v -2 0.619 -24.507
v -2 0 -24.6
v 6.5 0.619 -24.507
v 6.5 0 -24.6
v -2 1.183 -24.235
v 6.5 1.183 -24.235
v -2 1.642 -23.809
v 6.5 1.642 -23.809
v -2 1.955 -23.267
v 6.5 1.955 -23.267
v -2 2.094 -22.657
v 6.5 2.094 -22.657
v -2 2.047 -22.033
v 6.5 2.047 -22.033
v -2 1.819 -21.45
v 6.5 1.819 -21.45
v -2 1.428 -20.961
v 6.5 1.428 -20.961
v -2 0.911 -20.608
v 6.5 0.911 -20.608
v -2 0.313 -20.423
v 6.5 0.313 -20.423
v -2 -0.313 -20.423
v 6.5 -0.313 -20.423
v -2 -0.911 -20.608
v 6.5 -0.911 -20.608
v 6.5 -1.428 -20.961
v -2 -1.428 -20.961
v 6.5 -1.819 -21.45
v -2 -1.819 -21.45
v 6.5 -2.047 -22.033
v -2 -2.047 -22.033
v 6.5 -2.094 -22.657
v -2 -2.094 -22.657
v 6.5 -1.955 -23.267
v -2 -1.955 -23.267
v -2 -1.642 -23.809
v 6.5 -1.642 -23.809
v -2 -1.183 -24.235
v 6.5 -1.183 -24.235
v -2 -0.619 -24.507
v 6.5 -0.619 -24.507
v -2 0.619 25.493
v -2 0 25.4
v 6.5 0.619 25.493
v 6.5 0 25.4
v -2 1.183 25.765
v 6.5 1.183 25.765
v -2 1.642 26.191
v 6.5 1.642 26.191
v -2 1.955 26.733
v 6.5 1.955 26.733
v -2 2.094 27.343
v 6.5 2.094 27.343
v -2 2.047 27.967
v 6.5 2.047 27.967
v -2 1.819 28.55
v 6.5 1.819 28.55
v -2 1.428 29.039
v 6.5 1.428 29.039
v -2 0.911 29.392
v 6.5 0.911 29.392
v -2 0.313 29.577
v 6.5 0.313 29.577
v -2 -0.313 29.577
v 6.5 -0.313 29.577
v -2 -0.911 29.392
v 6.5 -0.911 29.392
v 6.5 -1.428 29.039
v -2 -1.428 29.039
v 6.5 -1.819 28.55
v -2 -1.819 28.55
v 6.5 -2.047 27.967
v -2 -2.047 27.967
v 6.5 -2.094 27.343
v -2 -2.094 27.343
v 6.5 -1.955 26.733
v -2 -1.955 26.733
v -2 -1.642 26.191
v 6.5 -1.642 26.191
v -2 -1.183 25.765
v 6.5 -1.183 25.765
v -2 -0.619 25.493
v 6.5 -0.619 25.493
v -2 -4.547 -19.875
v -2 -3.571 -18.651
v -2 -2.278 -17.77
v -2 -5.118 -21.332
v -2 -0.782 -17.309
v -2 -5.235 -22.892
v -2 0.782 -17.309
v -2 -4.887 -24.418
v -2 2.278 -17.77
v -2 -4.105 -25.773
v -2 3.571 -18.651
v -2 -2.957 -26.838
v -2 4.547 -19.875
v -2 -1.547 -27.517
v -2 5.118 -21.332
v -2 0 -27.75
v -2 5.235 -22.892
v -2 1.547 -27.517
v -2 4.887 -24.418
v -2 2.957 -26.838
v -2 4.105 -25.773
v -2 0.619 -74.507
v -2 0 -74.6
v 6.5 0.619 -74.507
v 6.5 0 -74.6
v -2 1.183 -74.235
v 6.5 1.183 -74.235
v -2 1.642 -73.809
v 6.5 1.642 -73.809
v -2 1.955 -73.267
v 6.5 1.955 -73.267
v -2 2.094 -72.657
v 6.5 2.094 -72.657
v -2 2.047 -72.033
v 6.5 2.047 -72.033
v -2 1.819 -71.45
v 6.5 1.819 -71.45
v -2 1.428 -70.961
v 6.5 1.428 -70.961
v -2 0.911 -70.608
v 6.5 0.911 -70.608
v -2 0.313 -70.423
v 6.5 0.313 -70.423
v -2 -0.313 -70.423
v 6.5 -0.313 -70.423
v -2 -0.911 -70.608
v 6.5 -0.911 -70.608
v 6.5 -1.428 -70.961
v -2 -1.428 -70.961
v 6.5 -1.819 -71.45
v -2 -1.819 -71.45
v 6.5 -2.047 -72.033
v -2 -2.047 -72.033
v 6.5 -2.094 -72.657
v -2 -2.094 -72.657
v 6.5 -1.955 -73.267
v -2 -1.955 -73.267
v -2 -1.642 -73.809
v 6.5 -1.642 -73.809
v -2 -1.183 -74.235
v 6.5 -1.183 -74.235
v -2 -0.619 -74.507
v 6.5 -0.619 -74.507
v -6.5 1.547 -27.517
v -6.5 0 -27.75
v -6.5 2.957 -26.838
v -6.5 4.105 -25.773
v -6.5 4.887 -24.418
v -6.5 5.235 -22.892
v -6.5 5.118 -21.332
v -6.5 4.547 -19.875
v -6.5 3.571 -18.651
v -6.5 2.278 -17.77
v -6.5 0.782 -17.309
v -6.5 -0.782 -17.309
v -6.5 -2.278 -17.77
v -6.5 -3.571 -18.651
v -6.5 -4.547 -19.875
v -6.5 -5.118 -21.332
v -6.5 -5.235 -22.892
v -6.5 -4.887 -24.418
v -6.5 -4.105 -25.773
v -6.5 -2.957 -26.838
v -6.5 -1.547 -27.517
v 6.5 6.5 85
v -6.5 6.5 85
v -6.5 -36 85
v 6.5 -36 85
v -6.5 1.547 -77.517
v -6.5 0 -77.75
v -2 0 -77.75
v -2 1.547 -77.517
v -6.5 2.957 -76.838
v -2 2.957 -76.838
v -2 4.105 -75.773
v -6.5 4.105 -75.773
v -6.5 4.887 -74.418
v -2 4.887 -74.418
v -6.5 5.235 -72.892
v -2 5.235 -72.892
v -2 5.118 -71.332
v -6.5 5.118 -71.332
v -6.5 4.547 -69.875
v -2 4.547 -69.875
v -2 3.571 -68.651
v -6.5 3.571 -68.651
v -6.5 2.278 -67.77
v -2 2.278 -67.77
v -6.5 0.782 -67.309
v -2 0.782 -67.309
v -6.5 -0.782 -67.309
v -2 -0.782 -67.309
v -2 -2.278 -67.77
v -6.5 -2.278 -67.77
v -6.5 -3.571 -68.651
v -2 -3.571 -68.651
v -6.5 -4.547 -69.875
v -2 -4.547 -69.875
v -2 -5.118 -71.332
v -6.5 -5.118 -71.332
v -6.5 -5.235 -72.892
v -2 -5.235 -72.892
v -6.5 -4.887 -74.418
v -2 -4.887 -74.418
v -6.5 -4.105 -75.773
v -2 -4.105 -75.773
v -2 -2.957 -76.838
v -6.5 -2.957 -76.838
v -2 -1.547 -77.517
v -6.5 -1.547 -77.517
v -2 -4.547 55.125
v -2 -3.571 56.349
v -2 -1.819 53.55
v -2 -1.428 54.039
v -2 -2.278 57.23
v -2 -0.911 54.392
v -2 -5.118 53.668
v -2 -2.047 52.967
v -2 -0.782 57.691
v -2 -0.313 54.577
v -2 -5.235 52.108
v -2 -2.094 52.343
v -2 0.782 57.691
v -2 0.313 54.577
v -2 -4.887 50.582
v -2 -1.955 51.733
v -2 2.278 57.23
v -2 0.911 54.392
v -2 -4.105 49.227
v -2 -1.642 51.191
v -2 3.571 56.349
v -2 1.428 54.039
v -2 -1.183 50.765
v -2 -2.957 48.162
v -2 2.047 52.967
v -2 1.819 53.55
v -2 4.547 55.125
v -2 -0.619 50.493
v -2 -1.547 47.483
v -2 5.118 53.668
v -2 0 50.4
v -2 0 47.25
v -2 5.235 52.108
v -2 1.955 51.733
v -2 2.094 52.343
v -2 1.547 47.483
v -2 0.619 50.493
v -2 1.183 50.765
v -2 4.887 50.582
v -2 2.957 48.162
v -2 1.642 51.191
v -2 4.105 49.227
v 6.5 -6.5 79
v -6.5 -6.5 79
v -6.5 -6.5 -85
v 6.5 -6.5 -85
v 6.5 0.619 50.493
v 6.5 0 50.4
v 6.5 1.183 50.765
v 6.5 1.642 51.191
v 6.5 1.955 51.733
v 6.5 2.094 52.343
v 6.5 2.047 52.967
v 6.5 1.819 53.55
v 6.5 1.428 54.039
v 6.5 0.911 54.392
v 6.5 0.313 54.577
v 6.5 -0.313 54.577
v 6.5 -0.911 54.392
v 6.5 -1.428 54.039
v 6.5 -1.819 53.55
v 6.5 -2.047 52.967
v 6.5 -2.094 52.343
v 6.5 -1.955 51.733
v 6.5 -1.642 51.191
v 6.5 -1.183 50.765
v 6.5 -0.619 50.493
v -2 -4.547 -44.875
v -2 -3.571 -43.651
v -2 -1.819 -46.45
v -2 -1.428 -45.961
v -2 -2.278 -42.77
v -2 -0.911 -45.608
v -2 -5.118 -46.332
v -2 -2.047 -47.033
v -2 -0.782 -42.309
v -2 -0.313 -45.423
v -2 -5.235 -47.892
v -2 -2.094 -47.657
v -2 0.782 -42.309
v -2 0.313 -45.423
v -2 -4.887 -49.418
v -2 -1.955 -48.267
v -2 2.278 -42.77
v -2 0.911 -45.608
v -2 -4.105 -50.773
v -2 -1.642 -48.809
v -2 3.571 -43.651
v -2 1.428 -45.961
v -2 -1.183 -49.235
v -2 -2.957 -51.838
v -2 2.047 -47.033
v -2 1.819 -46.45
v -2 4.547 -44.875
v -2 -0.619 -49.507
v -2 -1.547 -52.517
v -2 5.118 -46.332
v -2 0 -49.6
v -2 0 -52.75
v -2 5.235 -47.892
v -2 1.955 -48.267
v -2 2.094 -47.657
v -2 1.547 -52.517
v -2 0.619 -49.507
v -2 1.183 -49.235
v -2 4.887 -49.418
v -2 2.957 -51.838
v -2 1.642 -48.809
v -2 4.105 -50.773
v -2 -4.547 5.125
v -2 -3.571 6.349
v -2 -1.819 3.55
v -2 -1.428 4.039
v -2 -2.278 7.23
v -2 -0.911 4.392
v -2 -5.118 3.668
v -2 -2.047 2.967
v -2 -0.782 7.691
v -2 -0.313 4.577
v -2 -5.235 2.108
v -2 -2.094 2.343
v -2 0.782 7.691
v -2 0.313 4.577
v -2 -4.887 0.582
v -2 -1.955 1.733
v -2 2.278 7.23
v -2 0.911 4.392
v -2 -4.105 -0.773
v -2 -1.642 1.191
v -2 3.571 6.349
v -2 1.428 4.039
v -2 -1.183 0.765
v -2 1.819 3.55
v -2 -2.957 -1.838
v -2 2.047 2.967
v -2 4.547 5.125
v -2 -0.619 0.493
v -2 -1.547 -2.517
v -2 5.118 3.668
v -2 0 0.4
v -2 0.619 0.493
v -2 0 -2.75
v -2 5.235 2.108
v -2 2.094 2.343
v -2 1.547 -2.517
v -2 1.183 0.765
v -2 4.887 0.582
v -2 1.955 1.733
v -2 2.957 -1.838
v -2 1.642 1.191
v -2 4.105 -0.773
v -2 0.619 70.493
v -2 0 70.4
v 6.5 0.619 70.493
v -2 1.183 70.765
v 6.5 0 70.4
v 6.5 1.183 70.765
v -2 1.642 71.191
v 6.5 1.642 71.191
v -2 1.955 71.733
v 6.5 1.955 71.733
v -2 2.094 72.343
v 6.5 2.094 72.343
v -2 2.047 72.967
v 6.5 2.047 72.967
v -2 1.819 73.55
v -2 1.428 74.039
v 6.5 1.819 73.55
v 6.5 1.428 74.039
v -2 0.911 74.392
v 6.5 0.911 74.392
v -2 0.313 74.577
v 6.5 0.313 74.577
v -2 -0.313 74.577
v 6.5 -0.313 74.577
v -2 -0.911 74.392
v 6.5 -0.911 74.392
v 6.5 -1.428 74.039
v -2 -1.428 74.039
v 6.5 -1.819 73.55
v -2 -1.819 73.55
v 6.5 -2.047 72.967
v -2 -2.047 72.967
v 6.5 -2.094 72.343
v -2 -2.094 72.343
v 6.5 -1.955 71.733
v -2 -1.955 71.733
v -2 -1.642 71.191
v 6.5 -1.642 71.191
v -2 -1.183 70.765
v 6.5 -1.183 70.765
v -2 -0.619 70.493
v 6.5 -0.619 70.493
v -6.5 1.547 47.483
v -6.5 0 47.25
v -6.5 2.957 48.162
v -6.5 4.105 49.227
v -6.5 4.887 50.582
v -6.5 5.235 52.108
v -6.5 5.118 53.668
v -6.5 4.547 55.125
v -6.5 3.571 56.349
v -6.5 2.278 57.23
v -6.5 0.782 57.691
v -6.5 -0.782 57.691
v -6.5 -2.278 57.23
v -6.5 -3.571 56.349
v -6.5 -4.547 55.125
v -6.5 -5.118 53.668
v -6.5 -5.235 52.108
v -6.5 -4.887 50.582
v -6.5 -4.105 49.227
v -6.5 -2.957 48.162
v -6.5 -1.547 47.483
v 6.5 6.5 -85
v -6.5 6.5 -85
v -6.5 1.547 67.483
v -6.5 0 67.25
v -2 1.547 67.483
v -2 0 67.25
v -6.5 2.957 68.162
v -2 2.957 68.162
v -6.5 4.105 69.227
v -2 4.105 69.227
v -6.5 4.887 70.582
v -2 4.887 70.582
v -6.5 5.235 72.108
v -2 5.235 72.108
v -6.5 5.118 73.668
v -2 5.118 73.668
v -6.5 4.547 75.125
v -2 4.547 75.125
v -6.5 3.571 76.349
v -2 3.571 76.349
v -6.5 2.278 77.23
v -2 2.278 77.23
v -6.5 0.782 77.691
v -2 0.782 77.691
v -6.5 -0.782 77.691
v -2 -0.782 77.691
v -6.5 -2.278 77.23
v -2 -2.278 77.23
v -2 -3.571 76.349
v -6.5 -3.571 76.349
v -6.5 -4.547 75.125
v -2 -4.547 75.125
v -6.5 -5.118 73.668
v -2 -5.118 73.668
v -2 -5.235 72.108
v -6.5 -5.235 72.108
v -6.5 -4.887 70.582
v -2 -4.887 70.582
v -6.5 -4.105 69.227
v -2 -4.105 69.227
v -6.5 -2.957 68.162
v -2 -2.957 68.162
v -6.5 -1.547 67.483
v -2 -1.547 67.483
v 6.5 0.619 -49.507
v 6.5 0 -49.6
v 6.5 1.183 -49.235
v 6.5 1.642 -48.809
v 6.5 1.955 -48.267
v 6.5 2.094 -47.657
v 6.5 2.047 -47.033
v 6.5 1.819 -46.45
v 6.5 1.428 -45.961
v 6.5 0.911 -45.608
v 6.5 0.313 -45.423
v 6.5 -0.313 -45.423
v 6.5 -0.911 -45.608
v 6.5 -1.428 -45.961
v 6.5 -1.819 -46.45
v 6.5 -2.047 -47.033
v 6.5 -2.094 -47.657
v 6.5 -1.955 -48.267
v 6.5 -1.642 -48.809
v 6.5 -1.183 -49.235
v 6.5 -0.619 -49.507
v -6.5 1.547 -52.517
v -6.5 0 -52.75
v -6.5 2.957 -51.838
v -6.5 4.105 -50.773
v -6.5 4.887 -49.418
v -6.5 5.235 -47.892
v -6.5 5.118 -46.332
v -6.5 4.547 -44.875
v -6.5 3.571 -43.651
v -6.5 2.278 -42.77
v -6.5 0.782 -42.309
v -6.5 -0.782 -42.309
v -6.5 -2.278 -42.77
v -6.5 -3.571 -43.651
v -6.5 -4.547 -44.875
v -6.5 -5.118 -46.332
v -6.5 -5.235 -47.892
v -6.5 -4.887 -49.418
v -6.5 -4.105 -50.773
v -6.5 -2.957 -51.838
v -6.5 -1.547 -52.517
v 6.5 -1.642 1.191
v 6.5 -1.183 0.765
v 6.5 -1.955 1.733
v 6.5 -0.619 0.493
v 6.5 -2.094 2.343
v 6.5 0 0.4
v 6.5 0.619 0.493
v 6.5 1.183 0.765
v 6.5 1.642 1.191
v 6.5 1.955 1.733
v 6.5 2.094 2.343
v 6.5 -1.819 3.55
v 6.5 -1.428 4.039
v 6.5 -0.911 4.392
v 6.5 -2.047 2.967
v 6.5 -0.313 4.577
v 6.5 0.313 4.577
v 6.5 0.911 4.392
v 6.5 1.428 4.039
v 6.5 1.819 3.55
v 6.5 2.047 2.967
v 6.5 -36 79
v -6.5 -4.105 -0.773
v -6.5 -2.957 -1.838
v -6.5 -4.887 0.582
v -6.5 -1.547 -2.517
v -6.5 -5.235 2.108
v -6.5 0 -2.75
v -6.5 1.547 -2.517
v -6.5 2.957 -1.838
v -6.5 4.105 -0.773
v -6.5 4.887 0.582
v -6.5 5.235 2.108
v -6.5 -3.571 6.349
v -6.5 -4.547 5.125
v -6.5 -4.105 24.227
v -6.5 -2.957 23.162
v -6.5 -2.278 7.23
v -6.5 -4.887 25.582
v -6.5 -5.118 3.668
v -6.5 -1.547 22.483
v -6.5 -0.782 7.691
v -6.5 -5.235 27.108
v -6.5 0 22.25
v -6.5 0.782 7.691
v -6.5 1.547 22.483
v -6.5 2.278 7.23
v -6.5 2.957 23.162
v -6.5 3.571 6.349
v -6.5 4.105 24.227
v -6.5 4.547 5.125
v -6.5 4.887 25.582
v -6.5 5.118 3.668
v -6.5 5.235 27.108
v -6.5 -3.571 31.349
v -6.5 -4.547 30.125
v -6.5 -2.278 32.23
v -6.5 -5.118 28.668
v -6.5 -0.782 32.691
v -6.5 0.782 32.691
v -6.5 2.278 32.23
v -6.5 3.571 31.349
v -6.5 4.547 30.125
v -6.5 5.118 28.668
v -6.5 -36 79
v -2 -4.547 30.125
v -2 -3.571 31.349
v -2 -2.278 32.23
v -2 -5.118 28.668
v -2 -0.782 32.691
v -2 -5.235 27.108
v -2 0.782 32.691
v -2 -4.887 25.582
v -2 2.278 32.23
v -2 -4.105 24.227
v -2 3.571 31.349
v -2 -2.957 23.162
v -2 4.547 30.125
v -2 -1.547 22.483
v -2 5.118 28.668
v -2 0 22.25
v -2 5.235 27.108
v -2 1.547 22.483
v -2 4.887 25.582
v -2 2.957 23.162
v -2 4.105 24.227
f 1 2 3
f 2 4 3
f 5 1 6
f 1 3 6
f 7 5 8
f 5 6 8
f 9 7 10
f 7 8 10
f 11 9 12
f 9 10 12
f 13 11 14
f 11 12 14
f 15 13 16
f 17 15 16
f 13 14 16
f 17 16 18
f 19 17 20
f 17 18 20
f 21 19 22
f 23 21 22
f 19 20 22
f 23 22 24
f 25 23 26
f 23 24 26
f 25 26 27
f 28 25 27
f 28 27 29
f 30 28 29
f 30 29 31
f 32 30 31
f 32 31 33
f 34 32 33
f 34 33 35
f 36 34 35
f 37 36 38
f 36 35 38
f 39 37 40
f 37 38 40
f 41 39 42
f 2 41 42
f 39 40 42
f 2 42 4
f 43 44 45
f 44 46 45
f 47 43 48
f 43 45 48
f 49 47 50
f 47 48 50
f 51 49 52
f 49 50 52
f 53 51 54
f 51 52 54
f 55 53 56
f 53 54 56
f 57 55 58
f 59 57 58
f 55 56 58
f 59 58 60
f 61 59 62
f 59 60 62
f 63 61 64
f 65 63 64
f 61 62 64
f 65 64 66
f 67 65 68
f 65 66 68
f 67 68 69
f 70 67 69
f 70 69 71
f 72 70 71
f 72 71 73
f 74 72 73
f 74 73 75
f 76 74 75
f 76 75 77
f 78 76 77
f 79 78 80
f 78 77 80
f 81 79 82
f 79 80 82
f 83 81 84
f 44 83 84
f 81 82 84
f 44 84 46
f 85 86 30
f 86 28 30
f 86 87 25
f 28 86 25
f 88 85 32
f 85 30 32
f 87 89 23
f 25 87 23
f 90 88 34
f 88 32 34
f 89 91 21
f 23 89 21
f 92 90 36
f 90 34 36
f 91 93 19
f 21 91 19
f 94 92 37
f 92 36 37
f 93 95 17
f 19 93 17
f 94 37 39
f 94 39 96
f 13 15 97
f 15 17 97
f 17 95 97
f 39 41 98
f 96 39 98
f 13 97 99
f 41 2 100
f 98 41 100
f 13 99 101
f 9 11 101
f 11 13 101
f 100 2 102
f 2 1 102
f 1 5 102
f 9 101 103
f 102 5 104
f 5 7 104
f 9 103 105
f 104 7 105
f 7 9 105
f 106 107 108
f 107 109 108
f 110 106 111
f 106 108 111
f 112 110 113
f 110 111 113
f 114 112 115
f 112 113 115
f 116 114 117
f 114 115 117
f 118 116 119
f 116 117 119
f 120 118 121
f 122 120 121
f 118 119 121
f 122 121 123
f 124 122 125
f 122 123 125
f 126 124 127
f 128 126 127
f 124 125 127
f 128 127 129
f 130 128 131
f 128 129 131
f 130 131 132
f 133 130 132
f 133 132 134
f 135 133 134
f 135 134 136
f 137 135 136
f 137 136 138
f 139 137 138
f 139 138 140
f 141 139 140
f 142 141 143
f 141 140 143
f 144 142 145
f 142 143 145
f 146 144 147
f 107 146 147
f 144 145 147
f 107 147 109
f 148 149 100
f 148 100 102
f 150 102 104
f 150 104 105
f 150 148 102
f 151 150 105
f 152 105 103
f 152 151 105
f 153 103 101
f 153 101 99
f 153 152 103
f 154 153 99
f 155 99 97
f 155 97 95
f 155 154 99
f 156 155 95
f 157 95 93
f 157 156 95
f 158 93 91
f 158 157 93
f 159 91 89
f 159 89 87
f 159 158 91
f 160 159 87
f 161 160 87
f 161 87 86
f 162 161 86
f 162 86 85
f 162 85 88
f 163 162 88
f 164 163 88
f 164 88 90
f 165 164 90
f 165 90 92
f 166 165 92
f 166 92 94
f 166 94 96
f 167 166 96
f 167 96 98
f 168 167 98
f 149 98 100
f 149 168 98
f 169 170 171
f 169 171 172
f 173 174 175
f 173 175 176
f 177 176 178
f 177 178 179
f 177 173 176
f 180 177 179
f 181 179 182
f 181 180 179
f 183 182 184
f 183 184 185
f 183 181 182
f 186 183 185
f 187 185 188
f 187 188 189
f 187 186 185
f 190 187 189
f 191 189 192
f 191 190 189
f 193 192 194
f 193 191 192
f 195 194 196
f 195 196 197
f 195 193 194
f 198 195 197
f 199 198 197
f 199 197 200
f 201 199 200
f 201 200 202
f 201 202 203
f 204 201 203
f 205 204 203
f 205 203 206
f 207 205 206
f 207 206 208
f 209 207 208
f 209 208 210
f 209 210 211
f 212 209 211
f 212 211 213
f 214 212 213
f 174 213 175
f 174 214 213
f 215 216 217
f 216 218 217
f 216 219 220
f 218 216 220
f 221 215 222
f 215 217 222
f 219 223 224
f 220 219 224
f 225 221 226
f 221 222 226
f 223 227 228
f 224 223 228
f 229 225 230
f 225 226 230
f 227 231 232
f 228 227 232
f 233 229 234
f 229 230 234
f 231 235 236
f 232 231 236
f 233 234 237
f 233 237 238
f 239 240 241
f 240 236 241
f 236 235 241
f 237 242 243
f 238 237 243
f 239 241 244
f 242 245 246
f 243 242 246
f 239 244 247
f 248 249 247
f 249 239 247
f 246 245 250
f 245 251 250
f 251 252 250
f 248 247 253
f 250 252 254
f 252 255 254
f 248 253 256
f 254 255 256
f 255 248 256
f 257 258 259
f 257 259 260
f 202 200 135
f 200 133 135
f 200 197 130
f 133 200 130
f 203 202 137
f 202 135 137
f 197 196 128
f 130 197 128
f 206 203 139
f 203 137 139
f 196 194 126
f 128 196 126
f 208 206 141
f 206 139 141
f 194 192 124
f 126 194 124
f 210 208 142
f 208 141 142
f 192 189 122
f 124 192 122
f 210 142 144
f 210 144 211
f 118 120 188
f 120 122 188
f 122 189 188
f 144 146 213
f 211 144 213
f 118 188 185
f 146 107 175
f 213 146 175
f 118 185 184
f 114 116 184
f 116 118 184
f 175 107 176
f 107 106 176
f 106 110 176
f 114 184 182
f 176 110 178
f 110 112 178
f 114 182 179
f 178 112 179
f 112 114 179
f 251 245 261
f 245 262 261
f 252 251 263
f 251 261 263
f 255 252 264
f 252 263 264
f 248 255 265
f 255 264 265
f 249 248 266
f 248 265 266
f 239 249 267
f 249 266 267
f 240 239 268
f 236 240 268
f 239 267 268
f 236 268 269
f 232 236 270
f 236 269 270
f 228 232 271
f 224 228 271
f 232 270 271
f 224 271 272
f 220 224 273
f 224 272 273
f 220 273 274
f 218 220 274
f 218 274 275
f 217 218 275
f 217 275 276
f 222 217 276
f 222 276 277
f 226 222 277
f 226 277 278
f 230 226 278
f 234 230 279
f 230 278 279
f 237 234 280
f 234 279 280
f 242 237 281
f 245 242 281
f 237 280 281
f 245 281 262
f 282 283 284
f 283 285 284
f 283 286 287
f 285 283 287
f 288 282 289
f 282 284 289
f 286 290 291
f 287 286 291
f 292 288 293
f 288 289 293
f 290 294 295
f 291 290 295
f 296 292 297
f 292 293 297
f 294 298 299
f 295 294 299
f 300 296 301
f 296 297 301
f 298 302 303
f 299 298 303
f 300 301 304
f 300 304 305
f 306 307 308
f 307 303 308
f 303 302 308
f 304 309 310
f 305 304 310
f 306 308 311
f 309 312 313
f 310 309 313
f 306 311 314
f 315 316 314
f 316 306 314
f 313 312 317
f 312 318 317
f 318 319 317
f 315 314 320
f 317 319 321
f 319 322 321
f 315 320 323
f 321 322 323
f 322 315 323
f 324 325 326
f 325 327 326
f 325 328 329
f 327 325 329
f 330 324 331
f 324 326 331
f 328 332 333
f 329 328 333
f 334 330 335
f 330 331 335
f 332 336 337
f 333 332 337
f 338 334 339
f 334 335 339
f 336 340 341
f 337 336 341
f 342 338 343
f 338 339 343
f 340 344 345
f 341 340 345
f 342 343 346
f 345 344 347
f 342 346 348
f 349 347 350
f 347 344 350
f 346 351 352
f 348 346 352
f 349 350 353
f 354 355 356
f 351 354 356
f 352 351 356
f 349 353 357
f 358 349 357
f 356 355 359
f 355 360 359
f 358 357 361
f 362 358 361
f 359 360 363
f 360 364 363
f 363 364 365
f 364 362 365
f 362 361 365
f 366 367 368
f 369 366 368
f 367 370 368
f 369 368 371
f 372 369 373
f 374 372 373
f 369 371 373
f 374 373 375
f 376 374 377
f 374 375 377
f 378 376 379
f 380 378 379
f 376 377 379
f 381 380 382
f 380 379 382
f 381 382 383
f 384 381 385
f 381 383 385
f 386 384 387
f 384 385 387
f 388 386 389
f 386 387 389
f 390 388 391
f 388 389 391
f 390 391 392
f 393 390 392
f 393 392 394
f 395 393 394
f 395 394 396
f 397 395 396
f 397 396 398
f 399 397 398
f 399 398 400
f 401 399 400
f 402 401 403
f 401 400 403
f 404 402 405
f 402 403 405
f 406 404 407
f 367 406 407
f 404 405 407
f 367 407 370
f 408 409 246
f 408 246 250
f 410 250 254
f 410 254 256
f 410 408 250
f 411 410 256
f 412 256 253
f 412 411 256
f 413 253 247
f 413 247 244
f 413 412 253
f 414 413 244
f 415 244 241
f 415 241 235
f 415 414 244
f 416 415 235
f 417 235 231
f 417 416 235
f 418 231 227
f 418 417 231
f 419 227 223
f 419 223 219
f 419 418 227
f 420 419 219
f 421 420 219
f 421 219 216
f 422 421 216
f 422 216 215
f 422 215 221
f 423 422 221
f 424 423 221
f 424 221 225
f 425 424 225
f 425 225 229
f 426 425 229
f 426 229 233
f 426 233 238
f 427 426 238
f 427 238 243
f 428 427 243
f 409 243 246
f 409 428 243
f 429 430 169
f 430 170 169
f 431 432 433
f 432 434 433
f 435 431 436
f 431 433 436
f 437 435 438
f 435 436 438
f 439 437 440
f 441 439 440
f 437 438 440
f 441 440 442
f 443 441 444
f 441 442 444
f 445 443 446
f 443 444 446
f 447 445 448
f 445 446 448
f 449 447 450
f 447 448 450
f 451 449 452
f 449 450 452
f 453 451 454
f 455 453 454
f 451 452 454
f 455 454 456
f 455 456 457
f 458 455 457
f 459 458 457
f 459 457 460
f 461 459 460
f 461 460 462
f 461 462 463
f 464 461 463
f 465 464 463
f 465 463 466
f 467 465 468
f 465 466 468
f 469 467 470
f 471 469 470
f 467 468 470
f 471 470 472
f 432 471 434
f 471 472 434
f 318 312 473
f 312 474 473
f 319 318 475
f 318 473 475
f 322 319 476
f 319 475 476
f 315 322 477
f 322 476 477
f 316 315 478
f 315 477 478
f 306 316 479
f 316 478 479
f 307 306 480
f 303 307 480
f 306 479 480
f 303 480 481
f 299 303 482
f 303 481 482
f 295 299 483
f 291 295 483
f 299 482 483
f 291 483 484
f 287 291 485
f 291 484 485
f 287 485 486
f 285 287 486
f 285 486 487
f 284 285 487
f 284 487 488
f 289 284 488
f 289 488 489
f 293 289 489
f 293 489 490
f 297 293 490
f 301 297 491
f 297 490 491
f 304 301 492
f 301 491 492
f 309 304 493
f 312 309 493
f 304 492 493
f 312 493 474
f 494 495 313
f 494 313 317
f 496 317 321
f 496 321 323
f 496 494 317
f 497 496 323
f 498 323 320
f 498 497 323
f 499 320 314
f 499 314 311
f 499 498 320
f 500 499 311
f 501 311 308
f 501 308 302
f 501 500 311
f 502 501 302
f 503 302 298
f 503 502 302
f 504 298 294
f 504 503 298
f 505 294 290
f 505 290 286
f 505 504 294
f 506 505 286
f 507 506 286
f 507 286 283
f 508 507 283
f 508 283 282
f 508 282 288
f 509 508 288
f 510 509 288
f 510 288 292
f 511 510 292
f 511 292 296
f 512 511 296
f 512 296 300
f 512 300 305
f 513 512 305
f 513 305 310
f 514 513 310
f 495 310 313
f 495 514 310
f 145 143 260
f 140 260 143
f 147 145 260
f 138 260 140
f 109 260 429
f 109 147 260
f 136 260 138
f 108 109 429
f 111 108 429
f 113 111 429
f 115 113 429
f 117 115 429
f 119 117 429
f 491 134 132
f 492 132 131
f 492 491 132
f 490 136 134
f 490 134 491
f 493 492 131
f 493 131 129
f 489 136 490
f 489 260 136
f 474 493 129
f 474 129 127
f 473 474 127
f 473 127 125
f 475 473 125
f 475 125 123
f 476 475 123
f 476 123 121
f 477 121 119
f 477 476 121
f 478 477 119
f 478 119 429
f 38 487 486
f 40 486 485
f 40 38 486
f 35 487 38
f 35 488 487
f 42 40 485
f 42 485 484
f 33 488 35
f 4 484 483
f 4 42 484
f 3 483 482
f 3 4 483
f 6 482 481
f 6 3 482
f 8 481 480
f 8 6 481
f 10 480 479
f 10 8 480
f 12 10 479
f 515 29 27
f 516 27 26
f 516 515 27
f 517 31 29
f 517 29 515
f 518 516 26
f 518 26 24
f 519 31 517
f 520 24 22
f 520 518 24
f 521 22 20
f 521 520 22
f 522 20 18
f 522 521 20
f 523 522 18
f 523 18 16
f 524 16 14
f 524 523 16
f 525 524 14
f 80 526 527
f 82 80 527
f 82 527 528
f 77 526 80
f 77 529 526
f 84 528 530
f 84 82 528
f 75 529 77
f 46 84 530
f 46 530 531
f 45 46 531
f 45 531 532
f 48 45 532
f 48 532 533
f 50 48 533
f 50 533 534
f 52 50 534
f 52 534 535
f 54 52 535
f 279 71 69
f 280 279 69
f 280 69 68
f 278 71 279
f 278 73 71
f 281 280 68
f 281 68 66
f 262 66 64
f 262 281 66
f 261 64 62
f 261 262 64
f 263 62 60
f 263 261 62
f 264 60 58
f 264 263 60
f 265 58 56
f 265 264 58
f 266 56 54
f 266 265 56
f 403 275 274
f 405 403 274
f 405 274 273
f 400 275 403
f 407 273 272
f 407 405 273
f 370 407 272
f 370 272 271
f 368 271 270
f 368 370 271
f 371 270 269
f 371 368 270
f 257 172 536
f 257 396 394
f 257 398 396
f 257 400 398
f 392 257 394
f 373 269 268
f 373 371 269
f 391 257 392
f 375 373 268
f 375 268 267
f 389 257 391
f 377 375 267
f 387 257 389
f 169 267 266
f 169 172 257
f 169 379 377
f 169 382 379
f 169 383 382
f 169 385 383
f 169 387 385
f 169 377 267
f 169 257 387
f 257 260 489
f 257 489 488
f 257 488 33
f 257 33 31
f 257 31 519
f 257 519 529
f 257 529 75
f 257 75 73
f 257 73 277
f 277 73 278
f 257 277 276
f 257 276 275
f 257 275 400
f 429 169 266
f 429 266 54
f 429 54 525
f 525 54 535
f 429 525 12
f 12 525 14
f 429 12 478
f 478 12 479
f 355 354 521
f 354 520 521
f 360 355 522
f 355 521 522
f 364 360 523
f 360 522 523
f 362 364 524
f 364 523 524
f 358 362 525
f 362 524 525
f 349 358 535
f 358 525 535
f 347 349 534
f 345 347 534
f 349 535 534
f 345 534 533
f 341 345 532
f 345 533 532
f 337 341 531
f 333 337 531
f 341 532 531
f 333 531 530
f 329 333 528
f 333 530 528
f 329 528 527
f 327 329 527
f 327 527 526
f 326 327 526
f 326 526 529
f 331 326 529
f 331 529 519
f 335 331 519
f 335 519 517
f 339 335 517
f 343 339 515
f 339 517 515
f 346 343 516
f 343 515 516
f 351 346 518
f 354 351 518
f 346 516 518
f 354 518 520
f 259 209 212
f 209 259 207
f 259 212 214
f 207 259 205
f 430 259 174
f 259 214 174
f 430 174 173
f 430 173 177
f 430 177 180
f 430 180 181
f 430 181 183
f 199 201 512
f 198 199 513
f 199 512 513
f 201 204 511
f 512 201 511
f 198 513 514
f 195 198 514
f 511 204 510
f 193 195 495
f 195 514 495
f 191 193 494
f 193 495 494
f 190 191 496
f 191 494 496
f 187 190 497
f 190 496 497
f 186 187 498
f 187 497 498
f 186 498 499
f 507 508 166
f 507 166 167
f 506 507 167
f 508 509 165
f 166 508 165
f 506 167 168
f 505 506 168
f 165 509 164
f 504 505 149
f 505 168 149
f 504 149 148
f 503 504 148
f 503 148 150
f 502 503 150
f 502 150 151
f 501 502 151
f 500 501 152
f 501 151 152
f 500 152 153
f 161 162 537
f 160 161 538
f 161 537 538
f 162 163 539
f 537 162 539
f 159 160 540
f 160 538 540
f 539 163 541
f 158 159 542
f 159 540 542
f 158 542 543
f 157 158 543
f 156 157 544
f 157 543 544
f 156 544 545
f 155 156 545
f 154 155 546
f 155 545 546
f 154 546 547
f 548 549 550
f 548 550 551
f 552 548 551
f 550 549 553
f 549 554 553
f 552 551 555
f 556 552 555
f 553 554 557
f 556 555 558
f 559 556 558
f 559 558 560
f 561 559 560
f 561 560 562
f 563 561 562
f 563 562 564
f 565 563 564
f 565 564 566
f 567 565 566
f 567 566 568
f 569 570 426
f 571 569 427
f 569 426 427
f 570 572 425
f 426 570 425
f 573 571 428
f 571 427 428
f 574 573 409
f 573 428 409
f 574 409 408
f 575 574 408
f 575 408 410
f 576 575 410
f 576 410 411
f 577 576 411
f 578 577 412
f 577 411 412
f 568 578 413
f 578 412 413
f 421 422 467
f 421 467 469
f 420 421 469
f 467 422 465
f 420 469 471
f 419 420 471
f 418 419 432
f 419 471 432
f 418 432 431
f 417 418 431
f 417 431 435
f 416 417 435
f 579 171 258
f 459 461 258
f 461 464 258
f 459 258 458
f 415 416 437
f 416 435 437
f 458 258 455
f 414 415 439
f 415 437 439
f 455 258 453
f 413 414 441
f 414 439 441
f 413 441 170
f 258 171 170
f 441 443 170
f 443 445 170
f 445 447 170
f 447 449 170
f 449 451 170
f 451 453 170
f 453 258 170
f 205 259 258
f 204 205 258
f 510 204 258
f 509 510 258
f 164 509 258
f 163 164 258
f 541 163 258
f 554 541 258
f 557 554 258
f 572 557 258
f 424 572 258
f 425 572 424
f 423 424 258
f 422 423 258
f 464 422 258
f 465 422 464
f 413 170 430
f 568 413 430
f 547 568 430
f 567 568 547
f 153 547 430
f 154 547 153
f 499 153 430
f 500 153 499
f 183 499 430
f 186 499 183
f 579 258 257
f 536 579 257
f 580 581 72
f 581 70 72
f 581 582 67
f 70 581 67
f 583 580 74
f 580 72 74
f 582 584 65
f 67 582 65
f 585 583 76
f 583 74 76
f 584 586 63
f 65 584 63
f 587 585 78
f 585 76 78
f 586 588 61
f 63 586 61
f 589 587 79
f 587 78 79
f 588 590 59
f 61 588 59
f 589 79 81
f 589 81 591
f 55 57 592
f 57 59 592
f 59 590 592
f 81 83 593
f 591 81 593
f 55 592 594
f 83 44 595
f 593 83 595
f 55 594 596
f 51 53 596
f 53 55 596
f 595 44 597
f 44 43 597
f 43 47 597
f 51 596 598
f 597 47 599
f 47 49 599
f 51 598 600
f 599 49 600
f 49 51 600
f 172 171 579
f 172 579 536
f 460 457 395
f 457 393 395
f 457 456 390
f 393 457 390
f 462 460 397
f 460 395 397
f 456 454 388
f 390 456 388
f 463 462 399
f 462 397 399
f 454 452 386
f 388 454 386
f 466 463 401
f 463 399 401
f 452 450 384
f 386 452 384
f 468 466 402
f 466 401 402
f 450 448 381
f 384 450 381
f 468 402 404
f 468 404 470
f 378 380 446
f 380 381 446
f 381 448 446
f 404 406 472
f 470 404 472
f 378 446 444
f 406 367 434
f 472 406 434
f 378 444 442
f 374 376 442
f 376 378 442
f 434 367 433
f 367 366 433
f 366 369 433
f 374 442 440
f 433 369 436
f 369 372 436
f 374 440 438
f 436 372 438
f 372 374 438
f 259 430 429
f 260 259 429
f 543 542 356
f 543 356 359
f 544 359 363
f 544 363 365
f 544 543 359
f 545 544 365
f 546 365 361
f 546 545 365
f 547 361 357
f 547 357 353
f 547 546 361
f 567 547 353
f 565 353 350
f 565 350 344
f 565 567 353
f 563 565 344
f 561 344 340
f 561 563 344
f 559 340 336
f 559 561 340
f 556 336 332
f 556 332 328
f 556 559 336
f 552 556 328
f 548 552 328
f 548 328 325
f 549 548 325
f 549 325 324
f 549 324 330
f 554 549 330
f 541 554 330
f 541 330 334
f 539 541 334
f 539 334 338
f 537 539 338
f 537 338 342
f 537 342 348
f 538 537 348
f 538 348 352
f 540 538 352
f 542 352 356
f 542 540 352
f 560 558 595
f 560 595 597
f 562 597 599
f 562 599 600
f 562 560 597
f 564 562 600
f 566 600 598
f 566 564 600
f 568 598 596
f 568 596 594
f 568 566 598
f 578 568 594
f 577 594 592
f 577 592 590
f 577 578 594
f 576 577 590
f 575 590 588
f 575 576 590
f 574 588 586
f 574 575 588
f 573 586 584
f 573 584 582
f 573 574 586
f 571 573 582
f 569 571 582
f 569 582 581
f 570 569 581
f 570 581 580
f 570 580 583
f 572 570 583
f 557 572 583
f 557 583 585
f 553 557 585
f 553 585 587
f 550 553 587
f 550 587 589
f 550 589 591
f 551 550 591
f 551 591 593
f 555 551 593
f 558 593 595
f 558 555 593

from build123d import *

# Parameters (mm, degrees)
SKETCH1_W           = 13
SKETCH1_H           = 13
BOSS_EXTRUDE1_DEPTH = 85
SKETCH2_W           = 13
SKETCH2_H           = 30.5
BOSS_EXTRUDE2_DEPTH = 3
SKETCH3_R           = 2.1
CUT_EXTRUDE1_DEPTH  = 11.5
SKETCH4_R           = 5.25
CUT_EXTRUDE2_DEPTH  = 4.5


with BuildPart() as part:
    # Sketch1 → Boss-Extrude1 (new, symmetric)
    with BuildSketch(Plane.XY):
        Rectangle(SKETCH1_W, SKETCH1_H)
    extrude(amount=BOSS_EXTRUDE1_DEPTH, both=True)

    # Sketch2 → Boss-Extrude2 (add, symmetric)
    with BuildSketch(Plane.XY.offset(82)):
        with Locations((0, -20.75)):
            Rectangle(SKETCH2_W, SKETCH2_H)
    extrude(amount=BOSS_EXTRUDE2_DEPTH, both=True)

    # Sketch3 → Cut-Extrude1 (cut, symmetric)
    with BuildSketch(Plane(origin=(0, 0, 0), x_dir=(0, 0, -1), z_dir=(1, 0, 0))):
        with Locations((72.5, 0)):
            Circle(SKETCH3_R)
        with Locations((47.5, 0)):
            Circle(SKETCH3_R)
        with Locations((22.5, 0)):
            Circle(SKETCH3_R)
        with Locations((-2.5, 0)):
            Circle(SKETCH3_R)
        with Locations((-27.5, 0)):
            Circle(SKETCH3_R)
        with Locations((-52.5, 0)):
            Circle(SKETCH3_R)
        with Locations((-72.5, 0)):
            Circle(SKETCH3_R)
    extrude(amount=CUT_EXTRUDE1_DEPTH, both=True, mode=Mode.SUBTRACT)

    # Sketch4 → Cut-Extrude2 (cut, symmetric)
    with BuildSketch(Plane(origin=(-6.5, 0, 0), x_dir=(0, 0, -1), z_dir=(1, 0, 0))):
        with Locations((72.5, 0)):
            Circle(SKETCH4_R)
        with Locations((47.5, 0)):
            Circle(SKETCH4_R)
        with Locations((22.5, 0)):
            Circle(SKETCH4_R)
        with Locations((-2.5, 0)):
            Circle(SKETCH4_R)
        with Locations((-27.5, 0)):
            Circle(SKETCH4_R)
        with Locations((-52.5, 0)):
            Circle(SKETCH4_R)
        with Locations((-72.5, 0)):
            Circle(SKETCH4_R)
    extrude(amount=CUT_EXTRUDE2_DEPTH, both=True, mode=Mode.SUBTRACT)


solid = part.part
